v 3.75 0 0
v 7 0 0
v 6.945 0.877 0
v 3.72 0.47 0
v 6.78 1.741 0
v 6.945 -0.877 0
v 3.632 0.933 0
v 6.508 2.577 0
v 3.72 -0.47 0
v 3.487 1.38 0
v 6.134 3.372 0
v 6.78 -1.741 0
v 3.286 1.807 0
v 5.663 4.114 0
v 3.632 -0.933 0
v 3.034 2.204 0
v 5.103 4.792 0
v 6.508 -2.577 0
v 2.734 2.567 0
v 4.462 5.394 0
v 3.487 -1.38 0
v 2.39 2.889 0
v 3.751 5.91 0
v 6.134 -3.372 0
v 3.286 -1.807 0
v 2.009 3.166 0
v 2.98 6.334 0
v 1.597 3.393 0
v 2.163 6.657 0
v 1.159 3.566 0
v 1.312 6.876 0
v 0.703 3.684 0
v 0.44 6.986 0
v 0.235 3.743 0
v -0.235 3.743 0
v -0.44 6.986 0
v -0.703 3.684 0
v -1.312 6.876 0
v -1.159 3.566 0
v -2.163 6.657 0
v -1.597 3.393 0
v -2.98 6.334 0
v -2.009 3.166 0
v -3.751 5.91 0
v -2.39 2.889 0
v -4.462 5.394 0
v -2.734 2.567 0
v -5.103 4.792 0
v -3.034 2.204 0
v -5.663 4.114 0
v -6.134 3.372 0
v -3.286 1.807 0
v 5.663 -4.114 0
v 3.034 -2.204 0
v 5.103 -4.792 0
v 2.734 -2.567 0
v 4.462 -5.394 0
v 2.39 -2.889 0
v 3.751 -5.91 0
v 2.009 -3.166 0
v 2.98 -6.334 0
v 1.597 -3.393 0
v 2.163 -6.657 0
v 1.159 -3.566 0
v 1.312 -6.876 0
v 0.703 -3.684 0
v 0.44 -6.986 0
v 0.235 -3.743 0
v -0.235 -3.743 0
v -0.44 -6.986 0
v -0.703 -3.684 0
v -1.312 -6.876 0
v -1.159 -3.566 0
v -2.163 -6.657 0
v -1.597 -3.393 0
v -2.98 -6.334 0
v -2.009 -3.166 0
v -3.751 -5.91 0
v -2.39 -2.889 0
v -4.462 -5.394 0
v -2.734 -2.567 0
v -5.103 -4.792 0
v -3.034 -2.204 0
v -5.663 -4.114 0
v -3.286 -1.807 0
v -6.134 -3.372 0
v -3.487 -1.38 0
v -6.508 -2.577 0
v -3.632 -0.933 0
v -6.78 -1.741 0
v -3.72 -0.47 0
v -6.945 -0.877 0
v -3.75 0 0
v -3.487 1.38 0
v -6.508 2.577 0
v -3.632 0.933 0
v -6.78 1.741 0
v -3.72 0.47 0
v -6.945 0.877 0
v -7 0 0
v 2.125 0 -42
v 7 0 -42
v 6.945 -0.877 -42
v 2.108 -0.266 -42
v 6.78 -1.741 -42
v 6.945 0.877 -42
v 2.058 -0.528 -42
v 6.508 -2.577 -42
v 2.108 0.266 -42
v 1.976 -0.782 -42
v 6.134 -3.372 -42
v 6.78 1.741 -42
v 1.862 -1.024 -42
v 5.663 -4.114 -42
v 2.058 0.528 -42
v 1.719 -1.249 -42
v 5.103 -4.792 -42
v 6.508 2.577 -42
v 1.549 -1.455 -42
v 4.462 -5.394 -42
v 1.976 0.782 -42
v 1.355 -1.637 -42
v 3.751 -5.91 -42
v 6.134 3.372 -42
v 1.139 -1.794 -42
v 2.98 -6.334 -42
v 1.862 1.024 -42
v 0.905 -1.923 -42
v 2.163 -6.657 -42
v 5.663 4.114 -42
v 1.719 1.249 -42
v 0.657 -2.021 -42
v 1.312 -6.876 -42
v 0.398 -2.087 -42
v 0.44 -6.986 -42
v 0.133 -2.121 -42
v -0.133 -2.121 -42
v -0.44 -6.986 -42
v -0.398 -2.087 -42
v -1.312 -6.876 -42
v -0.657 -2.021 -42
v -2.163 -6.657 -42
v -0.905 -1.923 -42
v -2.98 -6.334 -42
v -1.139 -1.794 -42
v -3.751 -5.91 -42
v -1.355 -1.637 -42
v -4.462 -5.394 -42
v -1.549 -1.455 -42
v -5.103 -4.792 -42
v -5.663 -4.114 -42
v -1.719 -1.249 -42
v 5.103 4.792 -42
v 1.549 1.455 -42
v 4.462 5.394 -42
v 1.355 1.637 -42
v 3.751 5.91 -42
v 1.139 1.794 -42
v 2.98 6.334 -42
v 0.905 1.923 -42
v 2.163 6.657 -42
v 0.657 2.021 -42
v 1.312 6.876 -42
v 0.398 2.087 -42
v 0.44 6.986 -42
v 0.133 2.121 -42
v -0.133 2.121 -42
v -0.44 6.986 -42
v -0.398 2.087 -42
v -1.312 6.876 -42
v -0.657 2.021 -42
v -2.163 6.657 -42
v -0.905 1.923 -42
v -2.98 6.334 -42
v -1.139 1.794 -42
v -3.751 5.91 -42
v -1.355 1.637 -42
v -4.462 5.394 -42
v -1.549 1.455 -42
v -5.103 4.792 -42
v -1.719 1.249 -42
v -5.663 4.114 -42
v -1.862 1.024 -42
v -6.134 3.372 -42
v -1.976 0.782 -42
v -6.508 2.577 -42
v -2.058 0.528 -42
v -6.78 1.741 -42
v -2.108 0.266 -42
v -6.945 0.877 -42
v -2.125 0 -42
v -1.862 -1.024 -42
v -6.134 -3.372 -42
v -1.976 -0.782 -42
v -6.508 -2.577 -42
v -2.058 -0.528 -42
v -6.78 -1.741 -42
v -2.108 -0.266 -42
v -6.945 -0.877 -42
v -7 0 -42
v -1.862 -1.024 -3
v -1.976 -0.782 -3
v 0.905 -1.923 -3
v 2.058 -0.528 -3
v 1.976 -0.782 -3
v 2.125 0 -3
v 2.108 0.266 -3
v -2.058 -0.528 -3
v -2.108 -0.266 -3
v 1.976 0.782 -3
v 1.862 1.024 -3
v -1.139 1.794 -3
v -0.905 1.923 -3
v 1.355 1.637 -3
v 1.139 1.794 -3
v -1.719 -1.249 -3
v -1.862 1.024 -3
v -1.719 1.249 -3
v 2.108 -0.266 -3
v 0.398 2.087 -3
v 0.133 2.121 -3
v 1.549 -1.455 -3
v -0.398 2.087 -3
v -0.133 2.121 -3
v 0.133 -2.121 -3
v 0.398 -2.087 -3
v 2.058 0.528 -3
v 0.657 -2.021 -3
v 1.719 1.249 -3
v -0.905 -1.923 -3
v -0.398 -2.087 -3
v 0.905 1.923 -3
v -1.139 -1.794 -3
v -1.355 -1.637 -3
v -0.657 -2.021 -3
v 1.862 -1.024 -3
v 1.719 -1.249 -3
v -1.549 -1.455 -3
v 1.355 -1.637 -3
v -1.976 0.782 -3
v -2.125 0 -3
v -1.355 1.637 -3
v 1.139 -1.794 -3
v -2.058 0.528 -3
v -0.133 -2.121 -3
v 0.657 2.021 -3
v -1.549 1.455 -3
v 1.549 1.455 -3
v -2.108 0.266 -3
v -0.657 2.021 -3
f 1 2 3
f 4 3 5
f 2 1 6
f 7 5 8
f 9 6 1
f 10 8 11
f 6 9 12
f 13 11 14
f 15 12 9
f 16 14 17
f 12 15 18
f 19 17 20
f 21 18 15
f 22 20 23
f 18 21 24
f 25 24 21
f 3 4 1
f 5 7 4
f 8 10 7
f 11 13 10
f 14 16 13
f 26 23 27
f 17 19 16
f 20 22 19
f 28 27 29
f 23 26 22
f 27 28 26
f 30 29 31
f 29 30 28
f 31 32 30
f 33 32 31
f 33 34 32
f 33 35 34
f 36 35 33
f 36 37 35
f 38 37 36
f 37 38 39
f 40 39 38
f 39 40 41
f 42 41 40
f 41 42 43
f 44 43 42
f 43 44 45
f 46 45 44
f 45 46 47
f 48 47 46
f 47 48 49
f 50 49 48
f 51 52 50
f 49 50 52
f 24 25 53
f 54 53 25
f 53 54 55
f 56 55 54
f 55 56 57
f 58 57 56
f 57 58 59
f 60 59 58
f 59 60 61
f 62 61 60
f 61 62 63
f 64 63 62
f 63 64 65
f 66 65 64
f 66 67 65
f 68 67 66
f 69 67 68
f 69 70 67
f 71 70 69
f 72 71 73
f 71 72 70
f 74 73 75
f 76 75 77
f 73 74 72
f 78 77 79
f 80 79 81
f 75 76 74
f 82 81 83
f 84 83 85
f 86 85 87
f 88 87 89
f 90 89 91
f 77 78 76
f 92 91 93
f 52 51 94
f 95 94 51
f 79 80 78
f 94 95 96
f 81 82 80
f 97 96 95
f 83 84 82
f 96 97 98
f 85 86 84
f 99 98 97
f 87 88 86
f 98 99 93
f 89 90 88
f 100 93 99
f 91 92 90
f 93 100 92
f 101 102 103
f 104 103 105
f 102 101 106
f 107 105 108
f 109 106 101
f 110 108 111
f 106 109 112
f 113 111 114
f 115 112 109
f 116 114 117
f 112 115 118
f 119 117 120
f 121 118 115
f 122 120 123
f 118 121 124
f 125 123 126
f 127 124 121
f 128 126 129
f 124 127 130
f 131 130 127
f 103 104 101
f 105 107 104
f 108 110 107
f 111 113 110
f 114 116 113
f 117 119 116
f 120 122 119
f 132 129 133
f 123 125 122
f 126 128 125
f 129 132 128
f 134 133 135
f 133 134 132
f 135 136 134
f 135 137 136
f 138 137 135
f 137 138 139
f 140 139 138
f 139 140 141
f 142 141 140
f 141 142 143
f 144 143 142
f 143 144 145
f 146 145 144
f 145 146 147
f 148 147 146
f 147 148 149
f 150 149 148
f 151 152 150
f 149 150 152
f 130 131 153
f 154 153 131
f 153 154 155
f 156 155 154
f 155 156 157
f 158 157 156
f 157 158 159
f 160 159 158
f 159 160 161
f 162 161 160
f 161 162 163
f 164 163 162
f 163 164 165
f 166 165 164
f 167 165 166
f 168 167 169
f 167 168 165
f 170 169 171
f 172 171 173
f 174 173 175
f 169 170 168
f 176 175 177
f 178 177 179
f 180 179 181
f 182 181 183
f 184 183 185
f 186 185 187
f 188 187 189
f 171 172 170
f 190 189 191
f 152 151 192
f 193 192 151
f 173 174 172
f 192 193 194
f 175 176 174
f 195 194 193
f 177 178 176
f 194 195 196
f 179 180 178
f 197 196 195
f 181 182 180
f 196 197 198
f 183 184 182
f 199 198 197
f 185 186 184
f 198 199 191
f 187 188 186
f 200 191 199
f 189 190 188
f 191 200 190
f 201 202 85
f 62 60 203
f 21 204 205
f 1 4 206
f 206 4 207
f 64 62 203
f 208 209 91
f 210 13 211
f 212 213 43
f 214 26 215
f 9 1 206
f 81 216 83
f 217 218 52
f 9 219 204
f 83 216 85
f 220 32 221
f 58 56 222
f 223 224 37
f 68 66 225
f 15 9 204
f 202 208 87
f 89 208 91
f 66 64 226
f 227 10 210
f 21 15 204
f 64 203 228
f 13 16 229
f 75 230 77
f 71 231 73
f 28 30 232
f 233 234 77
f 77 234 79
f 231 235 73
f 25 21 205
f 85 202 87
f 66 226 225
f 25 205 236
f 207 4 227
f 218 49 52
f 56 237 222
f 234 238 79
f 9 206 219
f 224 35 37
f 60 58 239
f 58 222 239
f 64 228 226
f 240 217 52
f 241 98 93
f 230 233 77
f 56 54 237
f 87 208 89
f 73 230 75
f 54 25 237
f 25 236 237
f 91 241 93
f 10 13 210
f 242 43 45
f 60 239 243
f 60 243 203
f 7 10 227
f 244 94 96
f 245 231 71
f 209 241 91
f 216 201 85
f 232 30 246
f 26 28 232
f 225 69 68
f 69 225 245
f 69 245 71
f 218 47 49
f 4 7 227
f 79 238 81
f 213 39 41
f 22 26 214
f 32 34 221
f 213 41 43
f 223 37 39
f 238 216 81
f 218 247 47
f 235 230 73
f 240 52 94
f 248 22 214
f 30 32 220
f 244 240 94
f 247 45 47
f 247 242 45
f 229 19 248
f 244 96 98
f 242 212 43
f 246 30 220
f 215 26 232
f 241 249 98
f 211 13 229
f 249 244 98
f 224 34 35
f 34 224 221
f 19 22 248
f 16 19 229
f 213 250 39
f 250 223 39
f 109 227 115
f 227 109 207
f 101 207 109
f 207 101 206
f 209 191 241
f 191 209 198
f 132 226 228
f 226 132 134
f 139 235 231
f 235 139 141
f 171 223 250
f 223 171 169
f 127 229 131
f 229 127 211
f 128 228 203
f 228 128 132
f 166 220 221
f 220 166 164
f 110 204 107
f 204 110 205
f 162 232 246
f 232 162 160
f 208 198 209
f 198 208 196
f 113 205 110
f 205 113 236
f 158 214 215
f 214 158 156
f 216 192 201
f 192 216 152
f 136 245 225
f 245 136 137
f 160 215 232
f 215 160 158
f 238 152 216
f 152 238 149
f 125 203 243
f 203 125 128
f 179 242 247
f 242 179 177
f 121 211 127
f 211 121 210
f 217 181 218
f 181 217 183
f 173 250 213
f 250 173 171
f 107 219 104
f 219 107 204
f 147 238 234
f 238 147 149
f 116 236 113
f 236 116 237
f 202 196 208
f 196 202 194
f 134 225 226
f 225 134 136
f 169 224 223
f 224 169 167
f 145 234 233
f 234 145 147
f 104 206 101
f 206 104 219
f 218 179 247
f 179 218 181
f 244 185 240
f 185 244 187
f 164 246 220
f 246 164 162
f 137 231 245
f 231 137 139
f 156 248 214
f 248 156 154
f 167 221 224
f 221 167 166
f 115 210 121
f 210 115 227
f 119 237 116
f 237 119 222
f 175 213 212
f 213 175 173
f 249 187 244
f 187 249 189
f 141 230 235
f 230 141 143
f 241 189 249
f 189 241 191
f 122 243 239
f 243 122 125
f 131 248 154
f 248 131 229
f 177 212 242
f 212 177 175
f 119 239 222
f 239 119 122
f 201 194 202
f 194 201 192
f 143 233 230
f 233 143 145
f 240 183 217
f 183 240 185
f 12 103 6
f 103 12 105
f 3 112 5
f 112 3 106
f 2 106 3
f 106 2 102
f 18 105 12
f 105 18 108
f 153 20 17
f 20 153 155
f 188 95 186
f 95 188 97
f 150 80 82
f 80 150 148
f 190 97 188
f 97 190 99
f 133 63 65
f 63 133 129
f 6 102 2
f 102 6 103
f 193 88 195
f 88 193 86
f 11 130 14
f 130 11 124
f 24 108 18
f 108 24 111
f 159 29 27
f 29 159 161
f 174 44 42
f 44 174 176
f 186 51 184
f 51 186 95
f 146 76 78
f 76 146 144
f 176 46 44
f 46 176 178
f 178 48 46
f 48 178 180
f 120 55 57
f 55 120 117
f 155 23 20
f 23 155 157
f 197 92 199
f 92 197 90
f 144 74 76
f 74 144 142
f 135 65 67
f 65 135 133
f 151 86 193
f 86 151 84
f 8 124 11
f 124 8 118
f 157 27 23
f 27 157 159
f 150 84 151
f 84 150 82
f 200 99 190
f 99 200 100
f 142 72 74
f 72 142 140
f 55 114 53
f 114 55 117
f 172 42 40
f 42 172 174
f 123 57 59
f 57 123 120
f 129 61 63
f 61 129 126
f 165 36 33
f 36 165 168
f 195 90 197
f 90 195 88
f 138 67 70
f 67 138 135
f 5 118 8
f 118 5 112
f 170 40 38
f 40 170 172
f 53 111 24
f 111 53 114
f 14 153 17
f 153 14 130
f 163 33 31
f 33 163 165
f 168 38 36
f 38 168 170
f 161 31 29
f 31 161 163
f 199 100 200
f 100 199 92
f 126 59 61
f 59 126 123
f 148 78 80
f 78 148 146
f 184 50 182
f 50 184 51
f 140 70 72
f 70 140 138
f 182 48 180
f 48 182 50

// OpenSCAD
$fn = 50;


difference() {
	union() {
		translate(v = [0, 0, -42.0000000000]) {
			cylinder(h = 42, r = 7.0000000000);
		}
		cylinder(h = 0, r = 10.0000000000);
	}
	union() {
		translate(v = [0, 0, 0]) {
			rotate(a = [0, 0, 0]) {
				difference() {
					union() {
						#translate(v = [0, 0, -42.0000000000]) {
							cylinder(h = 42, r = 2.0000000000);
						}
						#translate(v = [0, 0, -3]) {
							cylinder(h = 3, r1 = 2.1250000000, r2 = 3.7500000000);
						}
						#translate(v = [0, 0, -42.0000000000]) {
							cylinder(h = 42, r = 2.1250000000);
						}
						#translate(v = [0, 0, -42.0000000000]) {
							cylinder(h = 42, r = 2.0000000000);
						}
					}
					union();
				}
			}
		}
	}
}
